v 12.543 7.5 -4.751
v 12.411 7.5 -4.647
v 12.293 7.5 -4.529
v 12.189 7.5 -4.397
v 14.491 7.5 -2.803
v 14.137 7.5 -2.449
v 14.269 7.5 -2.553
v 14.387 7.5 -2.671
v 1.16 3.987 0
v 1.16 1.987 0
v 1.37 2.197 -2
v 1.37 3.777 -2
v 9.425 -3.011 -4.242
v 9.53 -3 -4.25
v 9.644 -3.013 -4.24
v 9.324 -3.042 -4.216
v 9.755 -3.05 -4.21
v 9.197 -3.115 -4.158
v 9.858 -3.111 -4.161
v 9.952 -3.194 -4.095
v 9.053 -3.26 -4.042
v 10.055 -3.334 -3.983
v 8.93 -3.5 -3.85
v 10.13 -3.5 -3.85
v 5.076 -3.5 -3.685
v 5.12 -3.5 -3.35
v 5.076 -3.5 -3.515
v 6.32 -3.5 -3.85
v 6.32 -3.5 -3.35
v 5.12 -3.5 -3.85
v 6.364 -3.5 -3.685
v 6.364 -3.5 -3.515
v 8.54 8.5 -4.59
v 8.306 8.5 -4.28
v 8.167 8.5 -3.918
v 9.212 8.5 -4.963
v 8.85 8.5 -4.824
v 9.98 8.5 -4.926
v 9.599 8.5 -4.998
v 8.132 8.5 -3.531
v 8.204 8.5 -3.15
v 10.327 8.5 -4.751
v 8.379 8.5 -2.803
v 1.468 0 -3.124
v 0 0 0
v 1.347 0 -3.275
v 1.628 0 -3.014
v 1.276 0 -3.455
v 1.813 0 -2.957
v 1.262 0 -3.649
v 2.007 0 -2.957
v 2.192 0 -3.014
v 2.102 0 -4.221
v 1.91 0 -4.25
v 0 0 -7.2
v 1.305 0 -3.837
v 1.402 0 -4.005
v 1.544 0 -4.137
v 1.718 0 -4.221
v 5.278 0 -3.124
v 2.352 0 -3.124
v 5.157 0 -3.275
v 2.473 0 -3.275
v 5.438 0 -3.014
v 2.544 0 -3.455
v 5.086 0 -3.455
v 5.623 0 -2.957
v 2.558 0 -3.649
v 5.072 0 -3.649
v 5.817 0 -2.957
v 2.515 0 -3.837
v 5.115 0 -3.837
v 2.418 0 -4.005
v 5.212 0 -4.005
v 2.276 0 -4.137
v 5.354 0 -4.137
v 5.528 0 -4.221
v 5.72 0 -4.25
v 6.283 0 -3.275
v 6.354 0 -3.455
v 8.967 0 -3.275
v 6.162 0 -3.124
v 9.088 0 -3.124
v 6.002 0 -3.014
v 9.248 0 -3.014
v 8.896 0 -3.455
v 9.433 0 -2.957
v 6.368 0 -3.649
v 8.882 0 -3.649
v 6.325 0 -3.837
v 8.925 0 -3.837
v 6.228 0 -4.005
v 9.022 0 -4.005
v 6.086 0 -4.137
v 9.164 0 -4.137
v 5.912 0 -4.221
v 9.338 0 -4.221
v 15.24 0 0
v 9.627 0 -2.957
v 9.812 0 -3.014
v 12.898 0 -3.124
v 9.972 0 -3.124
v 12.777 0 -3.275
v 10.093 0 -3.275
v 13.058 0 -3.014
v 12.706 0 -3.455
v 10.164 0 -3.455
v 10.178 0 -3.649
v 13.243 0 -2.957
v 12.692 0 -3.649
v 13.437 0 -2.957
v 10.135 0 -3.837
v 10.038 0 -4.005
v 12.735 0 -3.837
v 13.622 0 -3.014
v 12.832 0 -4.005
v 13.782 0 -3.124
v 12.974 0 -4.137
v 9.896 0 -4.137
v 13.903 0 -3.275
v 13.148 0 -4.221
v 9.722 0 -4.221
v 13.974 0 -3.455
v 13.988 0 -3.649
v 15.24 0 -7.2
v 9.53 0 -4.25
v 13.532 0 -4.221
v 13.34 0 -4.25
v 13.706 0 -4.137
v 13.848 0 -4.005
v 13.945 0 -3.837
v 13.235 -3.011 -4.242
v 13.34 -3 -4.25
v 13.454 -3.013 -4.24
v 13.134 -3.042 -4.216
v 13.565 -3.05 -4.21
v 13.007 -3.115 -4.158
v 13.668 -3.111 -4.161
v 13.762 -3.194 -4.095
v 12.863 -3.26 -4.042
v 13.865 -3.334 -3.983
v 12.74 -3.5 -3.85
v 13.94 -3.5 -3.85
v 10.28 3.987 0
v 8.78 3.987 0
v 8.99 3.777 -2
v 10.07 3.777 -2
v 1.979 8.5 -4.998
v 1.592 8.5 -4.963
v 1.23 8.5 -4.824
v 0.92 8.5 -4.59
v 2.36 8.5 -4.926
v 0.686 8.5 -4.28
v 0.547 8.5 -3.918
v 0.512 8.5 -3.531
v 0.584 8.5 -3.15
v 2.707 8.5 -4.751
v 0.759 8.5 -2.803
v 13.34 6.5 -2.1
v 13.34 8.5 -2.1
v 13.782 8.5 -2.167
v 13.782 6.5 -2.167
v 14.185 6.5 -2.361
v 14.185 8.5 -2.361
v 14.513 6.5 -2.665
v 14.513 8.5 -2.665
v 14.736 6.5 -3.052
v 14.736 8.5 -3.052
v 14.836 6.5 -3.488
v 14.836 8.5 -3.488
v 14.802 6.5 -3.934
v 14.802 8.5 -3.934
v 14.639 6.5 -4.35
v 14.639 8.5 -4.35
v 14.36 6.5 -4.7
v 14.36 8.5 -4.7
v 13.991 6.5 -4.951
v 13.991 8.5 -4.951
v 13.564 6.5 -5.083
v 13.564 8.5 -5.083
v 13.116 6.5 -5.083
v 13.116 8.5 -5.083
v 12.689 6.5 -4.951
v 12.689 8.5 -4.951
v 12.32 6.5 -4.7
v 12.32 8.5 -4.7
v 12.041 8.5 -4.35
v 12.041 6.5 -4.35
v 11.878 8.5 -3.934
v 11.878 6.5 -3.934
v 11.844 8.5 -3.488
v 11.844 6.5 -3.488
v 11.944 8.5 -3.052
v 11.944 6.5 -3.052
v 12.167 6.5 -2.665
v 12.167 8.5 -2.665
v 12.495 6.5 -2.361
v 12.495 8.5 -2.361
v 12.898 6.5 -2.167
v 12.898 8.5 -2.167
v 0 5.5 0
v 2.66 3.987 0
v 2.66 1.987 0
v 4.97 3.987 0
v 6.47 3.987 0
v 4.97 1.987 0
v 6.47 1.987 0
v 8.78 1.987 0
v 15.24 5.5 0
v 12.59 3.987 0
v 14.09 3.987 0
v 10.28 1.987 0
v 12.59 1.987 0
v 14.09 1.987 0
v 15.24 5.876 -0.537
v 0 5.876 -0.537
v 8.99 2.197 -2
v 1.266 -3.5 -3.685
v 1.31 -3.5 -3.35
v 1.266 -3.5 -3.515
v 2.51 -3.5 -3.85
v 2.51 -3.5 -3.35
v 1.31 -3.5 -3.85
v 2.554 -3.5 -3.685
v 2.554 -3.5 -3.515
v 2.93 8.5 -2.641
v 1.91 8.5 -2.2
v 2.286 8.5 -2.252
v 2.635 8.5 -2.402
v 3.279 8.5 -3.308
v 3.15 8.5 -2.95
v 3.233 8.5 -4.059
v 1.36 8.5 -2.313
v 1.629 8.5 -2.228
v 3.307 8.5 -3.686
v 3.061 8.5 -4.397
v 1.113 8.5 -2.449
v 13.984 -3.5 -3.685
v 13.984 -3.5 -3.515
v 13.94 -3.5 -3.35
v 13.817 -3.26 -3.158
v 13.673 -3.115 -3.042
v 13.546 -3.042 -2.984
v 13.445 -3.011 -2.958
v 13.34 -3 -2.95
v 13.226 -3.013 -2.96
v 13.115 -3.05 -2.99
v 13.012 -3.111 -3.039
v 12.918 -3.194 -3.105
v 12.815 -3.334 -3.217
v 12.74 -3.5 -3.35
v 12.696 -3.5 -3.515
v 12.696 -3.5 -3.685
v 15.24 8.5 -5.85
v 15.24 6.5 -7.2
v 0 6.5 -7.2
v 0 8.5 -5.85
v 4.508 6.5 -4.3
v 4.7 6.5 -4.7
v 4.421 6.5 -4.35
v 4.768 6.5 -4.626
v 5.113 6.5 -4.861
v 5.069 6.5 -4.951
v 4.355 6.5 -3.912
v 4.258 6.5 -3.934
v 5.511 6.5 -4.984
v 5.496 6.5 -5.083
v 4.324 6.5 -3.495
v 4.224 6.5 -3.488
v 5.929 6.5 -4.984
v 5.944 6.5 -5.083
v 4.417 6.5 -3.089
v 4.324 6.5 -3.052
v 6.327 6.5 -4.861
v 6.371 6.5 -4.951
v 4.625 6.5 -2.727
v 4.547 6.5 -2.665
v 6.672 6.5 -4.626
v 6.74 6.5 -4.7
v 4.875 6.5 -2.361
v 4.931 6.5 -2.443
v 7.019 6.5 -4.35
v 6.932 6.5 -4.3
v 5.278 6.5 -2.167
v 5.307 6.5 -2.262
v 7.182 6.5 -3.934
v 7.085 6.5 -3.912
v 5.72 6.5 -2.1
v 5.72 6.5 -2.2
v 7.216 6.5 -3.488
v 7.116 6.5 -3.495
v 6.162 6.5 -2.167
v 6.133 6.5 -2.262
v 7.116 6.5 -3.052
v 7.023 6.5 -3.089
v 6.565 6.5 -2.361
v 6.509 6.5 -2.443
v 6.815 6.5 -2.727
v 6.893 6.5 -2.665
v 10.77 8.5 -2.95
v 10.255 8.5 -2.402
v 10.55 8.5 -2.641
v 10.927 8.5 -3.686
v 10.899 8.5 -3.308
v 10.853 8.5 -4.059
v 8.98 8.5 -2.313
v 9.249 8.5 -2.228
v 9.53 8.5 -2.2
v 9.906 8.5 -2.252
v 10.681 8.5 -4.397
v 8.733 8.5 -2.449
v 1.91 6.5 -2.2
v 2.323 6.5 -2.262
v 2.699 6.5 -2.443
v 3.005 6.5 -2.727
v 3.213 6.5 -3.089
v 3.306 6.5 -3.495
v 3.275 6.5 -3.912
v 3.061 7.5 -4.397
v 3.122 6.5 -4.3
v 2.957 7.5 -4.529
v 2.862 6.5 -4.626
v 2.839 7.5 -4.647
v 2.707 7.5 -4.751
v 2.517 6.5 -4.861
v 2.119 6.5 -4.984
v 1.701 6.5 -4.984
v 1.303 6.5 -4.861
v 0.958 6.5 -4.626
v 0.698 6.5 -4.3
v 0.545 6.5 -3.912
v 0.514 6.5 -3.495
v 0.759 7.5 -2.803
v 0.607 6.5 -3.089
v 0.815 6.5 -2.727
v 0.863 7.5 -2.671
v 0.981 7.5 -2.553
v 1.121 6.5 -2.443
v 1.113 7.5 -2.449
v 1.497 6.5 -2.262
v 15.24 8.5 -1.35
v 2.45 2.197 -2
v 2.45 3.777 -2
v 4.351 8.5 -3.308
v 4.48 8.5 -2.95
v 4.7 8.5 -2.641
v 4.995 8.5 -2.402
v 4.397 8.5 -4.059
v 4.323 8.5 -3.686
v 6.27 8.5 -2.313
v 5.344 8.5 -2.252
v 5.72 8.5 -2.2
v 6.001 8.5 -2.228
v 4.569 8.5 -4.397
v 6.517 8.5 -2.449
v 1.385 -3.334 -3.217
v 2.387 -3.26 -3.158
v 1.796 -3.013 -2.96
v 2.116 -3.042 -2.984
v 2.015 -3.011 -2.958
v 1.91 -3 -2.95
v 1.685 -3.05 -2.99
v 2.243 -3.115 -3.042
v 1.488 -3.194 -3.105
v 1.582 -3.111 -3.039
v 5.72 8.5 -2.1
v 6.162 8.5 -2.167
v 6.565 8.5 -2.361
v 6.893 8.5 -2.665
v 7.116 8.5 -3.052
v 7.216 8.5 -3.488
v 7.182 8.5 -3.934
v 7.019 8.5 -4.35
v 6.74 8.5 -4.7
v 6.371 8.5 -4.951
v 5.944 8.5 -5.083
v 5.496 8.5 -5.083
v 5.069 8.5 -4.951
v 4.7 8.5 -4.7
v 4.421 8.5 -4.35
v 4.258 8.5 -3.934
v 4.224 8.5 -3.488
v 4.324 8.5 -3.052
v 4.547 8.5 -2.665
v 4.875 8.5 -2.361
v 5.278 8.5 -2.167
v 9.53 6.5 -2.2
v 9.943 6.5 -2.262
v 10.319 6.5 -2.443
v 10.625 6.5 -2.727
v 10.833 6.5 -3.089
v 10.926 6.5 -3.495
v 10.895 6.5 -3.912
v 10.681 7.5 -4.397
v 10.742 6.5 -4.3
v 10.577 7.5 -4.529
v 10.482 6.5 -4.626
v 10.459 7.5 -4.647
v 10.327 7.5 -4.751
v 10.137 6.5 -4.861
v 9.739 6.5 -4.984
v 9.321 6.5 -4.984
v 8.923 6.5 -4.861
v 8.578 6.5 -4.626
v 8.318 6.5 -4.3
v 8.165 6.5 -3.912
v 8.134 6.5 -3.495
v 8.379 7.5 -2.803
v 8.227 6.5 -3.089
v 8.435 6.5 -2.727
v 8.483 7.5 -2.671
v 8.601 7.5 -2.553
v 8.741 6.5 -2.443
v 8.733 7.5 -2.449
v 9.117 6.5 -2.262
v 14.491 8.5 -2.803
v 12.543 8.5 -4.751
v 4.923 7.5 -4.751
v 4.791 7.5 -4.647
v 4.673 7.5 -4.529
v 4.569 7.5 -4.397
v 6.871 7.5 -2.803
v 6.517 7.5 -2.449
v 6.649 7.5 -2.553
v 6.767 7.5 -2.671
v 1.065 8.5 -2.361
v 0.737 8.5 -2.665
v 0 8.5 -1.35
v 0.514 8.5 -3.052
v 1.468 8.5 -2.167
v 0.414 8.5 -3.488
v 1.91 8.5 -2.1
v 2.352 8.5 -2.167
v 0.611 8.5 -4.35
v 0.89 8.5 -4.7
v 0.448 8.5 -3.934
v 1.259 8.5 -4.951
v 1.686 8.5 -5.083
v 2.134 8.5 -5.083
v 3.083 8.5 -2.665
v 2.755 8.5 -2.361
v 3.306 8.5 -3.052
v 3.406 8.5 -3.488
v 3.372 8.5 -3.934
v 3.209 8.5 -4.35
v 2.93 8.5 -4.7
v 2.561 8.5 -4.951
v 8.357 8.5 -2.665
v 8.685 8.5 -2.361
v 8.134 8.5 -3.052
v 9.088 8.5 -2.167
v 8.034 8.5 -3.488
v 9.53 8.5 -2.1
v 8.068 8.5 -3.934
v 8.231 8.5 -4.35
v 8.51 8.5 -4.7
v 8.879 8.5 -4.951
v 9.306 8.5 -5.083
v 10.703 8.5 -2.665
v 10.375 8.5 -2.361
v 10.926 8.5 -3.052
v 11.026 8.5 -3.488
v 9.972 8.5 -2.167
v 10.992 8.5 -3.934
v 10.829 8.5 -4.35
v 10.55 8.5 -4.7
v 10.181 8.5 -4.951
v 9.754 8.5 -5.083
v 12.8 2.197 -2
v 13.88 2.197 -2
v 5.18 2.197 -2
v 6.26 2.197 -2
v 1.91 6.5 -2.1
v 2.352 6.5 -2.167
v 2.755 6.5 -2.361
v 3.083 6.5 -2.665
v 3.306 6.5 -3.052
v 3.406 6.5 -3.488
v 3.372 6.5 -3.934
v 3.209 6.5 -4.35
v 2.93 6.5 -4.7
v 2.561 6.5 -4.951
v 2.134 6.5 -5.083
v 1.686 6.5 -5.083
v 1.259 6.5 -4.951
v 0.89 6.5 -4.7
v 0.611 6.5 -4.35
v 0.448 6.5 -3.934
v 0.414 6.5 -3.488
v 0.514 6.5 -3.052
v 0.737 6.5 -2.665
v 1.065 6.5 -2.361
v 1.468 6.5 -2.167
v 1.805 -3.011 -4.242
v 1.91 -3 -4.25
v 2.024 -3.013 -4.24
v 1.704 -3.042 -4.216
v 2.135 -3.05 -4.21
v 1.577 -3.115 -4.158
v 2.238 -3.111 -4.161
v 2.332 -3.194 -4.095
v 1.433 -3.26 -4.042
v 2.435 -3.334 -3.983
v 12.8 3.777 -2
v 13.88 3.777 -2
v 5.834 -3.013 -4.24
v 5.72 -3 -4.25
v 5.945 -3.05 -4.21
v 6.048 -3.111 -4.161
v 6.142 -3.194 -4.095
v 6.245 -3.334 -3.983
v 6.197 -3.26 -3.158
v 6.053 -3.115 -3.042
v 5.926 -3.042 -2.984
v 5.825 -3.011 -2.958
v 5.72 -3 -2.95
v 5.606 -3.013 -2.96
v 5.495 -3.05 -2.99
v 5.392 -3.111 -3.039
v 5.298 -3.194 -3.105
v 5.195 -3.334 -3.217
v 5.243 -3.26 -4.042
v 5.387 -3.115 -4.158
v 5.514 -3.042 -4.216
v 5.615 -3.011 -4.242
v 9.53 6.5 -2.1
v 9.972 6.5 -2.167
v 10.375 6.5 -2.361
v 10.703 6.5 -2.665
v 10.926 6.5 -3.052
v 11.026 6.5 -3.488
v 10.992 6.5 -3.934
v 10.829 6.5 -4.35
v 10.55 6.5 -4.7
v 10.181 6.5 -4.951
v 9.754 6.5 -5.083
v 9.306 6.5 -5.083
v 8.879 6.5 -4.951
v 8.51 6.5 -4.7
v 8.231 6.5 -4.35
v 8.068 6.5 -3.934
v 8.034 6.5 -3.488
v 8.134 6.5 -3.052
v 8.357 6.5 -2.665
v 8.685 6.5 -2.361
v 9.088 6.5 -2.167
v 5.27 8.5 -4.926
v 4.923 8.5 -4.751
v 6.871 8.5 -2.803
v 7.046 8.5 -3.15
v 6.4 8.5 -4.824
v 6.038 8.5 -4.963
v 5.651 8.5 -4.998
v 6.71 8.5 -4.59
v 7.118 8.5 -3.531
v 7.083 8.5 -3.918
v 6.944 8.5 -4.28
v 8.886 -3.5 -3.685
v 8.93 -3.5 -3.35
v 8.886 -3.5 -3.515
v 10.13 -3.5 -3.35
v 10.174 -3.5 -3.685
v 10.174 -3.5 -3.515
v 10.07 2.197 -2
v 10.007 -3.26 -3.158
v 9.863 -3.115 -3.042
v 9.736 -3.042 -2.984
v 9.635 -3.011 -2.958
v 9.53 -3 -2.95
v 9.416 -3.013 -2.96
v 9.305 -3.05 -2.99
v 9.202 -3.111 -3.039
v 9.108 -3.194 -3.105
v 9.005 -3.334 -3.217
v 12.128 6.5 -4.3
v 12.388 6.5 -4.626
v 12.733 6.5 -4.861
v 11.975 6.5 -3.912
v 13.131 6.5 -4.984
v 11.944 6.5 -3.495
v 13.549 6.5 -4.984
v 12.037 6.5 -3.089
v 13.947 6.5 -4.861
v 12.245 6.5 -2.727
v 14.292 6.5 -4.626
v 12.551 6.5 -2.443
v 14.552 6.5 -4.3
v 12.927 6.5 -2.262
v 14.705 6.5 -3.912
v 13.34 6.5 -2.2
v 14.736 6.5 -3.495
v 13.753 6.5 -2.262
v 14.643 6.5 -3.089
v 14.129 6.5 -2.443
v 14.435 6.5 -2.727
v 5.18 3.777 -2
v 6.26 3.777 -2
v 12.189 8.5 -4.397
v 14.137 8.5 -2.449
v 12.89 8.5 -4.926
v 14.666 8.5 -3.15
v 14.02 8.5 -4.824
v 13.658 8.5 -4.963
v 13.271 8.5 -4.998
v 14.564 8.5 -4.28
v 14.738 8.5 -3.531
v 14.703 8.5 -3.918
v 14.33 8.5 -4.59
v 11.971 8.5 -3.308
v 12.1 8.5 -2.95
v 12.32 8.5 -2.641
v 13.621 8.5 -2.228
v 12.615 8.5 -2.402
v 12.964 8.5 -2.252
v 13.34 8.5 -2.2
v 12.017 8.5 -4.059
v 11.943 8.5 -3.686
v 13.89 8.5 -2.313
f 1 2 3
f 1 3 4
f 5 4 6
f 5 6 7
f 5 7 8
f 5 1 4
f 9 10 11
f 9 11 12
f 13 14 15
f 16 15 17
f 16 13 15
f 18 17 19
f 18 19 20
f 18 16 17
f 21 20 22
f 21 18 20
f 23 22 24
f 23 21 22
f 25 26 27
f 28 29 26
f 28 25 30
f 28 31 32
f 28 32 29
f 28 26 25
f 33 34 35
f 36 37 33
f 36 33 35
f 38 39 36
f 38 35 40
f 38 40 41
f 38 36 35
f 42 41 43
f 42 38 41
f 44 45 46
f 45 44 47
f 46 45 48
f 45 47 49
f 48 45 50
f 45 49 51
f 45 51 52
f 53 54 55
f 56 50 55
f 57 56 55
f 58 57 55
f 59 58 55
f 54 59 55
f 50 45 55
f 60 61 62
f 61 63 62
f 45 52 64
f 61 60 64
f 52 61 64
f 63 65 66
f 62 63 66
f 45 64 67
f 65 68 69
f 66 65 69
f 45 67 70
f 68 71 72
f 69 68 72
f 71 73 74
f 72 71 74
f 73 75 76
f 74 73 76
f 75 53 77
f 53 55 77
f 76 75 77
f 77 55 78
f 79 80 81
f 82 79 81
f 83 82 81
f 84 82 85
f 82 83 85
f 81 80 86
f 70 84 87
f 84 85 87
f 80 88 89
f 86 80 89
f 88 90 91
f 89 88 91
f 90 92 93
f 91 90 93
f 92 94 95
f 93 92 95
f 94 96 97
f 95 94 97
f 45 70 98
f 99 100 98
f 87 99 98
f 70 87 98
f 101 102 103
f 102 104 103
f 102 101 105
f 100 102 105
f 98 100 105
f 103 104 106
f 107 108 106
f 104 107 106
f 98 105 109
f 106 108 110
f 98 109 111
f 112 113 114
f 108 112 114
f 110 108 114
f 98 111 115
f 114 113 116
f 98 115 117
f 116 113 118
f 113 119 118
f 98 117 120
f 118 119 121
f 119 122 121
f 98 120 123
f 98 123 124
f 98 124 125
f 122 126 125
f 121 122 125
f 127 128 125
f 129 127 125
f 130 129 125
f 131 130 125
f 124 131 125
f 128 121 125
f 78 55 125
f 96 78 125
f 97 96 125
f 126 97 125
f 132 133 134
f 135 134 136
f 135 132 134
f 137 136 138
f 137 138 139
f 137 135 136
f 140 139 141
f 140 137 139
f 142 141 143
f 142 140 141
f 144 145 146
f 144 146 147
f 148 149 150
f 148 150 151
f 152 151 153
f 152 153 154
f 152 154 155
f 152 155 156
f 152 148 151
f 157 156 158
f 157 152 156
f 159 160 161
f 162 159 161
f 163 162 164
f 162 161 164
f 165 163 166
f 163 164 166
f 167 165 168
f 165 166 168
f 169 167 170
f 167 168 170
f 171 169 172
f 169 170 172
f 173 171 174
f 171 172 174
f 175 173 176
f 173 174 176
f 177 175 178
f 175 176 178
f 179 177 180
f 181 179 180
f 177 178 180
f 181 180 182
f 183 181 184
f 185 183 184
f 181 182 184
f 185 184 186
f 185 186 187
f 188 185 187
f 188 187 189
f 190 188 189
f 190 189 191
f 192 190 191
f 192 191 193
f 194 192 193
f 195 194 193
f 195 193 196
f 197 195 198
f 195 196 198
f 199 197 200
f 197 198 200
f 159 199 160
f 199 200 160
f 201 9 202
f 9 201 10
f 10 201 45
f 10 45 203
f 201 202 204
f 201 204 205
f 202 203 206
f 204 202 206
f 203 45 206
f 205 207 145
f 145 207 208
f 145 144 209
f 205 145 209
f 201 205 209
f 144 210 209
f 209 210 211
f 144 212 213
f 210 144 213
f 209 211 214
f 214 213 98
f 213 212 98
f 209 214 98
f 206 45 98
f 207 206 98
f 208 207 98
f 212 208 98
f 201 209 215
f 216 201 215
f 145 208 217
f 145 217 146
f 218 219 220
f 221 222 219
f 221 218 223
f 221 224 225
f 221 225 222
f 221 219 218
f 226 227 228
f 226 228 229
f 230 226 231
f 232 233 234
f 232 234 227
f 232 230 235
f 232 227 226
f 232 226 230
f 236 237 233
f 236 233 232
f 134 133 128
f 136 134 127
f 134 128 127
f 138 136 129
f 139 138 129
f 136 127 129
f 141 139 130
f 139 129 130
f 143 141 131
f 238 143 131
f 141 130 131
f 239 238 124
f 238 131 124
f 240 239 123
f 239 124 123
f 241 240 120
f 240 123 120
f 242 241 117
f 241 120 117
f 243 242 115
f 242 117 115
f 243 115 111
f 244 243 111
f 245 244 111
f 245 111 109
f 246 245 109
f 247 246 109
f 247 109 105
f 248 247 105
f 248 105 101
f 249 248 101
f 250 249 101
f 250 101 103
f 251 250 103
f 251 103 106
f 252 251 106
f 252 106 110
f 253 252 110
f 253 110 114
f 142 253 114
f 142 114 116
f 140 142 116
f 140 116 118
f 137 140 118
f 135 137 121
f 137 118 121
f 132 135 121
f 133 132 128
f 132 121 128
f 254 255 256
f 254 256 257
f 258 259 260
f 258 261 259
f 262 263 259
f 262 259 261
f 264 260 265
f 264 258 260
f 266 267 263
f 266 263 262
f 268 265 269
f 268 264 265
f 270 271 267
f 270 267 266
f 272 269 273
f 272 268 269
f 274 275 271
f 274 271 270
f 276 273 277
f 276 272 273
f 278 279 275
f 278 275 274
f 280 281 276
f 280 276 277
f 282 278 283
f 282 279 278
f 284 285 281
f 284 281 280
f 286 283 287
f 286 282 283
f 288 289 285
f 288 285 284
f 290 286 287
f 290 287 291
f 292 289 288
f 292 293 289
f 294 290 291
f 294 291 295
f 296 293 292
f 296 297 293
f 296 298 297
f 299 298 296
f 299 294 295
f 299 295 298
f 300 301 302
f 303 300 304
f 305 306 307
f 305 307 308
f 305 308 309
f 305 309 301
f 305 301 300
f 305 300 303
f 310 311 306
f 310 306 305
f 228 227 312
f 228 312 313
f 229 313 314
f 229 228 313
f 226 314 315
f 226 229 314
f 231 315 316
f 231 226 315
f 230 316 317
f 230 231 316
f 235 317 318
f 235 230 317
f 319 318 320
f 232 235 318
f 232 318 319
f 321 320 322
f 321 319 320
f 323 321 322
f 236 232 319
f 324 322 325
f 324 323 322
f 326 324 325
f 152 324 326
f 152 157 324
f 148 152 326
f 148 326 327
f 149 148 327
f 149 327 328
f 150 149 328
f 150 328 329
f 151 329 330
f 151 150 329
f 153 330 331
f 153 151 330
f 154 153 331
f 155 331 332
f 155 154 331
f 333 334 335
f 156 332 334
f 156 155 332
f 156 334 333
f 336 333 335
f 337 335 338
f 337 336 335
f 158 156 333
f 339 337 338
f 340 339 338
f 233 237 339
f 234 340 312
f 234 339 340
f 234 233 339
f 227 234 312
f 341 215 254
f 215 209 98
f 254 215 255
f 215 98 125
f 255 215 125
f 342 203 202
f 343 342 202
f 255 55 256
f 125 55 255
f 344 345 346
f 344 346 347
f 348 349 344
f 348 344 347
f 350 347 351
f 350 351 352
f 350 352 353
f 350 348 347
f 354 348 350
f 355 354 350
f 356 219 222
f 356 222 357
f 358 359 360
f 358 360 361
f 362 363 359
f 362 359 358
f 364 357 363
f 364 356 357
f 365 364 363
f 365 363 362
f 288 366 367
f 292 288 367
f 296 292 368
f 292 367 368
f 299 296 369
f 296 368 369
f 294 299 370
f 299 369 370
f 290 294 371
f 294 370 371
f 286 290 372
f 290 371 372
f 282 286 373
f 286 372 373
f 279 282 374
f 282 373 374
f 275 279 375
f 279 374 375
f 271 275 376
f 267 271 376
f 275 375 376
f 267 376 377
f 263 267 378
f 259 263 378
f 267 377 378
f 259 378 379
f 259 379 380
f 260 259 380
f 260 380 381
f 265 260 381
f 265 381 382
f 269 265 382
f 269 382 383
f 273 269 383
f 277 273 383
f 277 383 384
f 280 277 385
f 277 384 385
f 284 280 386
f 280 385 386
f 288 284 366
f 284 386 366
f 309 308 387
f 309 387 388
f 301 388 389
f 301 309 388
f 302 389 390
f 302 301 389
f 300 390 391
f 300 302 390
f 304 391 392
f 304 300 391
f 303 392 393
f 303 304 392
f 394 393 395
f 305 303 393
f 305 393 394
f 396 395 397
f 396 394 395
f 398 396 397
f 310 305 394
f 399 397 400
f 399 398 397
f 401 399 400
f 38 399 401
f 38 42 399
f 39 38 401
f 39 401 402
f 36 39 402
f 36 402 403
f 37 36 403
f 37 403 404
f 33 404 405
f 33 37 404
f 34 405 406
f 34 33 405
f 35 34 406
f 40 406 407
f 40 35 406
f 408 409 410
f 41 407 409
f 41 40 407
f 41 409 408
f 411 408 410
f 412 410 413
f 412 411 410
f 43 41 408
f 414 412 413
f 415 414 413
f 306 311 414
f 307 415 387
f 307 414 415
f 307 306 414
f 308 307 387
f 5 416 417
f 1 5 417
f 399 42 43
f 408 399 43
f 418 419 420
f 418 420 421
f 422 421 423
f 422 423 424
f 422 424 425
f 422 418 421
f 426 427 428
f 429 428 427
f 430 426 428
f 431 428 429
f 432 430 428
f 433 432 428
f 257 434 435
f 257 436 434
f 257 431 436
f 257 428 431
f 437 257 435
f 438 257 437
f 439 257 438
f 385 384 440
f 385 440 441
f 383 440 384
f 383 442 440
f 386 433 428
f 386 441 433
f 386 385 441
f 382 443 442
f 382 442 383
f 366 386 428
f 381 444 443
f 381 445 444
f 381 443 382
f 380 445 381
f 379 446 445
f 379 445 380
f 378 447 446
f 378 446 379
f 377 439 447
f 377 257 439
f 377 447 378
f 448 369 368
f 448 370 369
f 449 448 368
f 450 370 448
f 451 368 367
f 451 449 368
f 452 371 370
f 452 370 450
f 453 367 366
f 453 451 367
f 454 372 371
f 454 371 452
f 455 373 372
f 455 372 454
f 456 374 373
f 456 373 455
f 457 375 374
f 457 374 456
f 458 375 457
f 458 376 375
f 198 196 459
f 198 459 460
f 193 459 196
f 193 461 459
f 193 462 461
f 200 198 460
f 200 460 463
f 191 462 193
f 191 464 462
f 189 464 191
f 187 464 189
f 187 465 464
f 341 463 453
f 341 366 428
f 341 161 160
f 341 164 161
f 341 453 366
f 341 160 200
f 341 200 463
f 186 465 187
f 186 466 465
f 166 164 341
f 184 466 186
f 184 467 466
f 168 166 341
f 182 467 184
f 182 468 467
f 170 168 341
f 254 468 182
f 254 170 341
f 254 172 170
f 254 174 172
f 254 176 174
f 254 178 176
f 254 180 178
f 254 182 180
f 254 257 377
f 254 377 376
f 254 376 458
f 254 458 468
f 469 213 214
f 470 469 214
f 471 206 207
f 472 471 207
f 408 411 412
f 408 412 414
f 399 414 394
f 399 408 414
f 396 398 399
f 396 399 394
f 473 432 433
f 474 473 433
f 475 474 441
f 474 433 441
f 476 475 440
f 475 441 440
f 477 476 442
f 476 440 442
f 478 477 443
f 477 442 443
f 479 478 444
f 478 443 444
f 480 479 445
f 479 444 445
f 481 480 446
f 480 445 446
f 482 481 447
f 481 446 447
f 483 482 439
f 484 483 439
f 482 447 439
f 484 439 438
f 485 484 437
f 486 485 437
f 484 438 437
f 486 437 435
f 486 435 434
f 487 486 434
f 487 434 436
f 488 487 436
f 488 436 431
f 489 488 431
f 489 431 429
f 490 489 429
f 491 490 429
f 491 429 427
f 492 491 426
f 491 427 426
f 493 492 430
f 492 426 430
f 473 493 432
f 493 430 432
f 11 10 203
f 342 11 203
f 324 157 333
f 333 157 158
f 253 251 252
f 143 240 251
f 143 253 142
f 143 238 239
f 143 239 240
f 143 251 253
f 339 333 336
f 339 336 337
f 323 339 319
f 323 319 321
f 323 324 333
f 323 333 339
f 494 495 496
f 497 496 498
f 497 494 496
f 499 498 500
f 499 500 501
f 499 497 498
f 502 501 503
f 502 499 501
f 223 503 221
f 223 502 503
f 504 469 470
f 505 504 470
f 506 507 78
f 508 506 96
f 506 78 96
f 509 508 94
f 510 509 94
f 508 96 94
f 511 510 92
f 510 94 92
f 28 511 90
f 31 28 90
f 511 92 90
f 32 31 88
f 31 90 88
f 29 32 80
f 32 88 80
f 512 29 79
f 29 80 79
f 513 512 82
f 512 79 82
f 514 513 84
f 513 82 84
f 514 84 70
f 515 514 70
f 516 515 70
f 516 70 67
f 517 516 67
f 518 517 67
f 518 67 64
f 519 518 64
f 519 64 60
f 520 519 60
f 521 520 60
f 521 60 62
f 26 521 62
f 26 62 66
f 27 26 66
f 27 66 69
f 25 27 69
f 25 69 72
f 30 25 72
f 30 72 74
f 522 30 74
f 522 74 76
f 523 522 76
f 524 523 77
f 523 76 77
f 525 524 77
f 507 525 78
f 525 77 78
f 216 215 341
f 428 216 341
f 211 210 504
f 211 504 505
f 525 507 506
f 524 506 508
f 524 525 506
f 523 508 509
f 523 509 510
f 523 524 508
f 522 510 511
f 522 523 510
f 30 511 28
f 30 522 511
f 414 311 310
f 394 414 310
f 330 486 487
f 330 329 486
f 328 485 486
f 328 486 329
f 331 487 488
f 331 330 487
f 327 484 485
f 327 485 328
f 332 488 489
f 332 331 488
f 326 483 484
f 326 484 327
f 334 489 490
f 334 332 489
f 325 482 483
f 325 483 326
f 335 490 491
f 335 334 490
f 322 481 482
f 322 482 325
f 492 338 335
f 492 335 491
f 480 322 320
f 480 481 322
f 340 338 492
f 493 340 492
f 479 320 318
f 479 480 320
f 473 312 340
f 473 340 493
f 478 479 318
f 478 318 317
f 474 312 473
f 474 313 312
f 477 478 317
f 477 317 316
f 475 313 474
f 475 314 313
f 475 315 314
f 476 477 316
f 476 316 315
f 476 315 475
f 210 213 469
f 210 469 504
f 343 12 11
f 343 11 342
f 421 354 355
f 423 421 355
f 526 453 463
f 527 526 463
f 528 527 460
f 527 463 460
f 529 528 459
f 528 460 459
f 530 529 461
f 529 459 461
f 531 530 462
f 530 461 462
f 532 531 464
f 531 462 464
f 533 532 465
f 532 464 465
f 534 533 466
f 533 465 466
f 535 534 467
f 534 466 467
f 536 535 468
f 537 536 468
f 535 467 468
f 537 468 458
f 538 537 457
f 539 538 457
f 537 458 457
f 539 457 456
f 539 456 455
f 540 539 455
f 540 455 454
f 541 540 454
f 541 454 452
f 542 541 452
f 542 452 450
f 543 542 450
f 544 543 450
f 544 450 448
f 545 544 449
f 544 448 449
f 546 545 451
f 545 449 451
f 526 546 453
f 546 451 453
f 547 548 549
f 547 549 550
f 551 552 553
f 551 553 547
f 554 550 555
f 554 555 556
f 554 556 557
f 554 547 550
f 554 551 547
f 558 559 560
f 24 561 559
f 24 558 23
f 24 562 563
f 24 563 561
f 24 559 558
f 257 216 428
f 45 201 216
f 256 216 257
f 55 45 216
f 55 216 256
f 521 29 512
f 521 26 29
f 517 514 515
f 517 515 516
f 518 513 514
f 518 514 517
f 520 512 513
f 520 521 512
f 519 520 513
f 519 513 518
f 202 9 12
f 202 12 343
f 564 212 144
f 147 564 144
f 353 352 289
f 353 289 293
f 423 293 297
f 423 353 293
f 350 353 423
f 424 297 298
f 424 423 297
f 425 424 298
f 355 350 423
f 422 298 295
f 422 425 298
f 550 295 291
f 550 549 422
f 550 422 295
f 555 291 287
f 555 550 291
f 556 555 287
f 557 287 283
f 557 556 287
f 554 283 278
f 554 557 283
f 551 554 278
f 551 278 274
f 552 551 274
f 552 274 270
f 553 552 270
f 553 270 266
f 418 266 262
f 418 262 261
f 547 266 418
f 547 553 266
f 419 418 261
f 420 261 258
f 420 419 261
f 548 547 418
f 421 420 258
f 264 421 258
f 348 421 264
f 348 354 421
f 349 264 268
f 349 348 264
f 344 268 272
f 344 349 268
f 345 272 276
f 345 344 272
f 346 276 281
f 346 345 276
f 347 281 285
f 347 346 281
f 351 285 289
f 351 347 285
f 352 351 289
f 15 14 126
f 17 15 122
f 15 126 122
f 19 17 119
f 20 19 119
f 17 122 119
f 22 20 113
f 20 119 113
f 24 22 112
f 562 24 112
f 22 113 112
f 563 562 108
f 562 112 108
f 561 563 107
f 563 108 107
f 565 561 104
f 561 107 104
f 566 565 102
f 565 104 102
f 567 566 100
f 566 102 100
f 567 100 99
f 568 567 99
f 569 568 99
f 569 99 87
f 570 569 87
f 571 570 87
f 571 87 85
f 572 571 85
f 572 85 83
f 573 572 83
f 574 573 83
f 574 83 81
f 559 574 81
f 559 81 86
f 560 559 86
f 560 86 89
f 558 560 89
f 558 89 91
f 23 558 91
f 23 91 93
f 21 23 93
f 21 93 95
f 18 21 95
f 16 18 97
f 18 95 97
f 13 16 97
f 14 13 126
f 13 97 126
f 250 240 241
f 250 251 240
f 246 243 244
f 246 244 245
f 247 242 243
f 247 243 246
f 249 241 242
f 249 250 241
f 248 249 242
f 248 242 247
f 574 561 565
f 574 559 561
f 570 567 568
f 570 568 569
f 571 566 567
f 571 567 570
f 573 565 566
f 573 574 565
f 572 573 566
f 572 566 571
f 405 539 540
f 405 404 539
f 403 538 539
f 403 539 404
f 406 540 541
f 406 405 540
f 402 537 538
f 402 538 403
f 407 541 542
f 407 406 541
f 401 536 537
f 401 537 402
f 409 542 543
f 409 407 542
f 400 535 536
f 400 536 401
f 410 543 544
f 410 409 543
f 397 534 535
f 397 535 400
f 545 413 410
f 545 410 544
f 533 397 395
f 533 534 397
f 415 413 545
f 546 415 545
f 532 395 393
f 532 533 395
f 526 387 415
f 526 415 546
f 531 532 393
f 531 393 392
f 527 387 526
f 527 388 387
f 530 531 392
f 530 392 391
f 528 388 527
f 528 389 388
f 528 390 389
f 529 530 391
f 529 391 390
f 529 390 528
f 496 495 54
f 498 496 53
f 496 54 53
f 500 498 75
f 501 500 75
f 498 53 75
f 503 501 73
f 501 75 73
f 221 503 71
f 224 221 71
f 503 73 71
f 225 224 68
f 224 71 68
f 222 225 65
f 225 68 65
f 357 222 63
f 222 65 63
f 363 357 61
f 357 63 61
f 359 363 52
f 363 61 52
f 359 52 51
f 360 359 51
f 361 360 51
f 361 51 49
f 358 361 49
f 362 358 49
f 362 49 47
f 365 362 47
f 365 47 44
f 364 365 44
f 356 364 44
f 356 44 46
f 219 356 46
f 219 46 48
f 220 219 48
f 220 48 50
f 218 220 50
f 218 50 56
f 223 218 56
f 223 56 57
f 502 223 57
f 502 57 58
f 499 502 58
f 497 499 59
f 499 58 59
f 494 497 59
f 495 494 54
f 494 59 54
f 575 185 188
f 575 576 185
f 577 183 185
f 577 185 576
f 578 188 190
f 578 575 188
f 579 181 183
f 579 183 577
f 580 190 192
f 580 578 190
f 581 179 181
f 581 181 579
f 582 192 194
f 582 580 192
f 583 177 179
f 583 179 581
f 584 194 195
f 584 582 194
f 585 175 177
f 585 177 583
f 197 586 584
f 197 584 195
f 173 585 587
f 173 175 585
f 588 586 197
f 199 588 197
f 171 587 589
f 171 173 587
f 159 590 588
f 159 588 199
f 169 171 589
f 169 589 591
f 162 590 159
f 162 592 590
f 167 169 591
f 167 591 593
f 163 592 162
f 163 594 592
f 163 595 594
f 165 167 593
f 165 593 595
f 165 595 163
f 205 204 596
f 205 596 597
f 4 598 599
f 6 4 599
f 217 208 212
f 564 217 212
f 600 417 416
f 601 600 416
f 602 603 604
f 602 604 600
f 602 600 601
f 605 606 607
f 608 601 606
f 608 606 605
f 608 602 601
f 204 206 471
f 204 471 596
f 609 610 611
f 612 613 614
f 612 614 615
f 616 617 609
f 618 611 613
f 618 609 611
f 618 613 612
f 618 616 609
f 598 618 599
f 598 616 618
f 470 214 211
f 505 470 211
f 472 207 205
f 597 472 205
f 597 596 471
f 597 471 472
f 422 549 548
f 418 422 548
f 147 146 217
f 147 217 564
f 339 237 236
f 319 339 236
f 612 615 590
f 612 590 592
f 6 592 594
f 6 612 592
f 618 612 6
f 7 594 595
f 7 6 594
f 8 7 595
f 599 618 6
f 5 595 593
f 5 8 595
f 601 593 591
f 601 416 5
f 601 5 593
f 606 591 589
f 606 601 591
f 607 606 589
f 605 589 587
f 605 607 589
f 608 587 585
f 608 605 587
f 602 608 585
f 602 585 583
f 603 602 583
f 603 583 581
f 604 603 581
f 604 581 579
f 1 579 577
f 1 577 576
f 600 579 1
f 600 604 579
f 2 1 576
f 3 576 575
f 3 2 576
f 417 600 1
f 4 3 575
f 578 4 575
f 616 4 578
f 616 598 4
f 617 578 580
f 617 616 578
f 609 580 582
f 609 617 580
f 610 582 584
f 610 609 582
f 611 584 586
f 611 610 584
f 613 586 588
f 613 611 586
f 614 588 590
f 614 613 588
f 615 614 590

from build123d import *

# Parameters (mm, degrees)
SKETCH3_W                    = 15.24
SKETCH3_H                    = 7.2
BOSS_EXTRUDE1_DEPTH          = 8.5
SKETCH4_R                    = 0.65
BOSS_EXTRUDE2_DEPTH          = 3.5
CUT_EXTRUDE1_REACH           = 20.877
CUT_EXTRUDE3_DEPTH           = 15.24
SKETCH13_W                   = 1.5
SKETCH13_H                   = 2
CUT_EXTRUDE4_DEPTH           = 2
CUT_EXTRUDE4_DRAFT           = -6
CUT_EXTRUDE4_PROFILE_2_DEPTH = 2
CUT_EXTRUDE4_PROFILE_2_DRAFT = -6
CUT_EXTRUDE4_PROFILE_3_DEPTH = 2
CUT_EXTRUDE4_PROFILE_3_DRAFT = -6
CUT_EXTRUDE4_PROFILE_4_DEPTH = 2
CUT_EXTRUDE4_PROFILE_4_DRAFT = -6
SKETCH14_R                   = 1.5
SKETCH14_R_2                 = 1.4
CUT_EXTRUDE5_DEPTH           = 2
CUT_EXTRUDE6_DEPTH           = 1


with BuildPart() as part:
    # Sketch3 → Boss-Extrude1 (new body)
    with BuildSketch(Plane(origin=(0, 0, 0), x_dir=(1, 0, 0), z_dir=(0, 1, 0))):
        with Locations((7.62, 3.6)):
            Rectangle(SKETCH3_W, SKETCH3_H)
    extrude(amount=BOSS_EXTRUDE1_DEPTH)

    # Sketch4 → Boss-Extrude2 (add)
    with BuildSketch(Plane(origin=(0, 0, 0), x_dir=(-1, 0, 0), z_dir=(0, -1, 0))):
        with Locations(Location((-1.91, 3.6, 0), (0, 0, 90))):
            Circle(SKETCH4_R)
        with Locations(Location((-5.72, 3.6, 0), (0, 0, 90))):
            Circle(SKETCH4_R)
        with Locations(Location((-9.53, 3.6, 0), (0, 0, 90))):
            Circle(SKETCH4_R)
        with Locations(Location((-13.34, 3.6, 0), (0, 0, 90))):
            Circle(SKETCH4_R)
    extrude(amount=BOSS_EXTRUDE2_DEPTH)

    # Cut-Extrude1: up to this face of the body (flat: up to its plane)
    cut_extrude1_end = Plane(part.part.faces().sort_by_distance((15.24, 4.25, -3.6))[0])
    # Sketch5 → Cut-Extrude1 (cut, up to the picked face)
    with BuildSketch(Plane.ZY, mode=Mode.PRIVATE) as cut_extrude1_sk1:
        Polygon((-2.95, -3), (-2.95, -3.5), (-3.35, -3.5), align=None)
    cut_extrude1_tool1 = split(extrude(cut_extrude1_sk1.sketch, amount=-CUT_EXTRUDE1_REACH, mode=Mode.PRIVATE), bisect_by=cut_extrude1_end, keep=Keep.BOTH, mode=Mode.PRIVATE)
    # Sketch5 → Cut-Extrude1 (cut, up to the picked face)
    with BuildSketch(Plane.ZY, mode=Mode.PRIVATE) as cut_extrude1_sk2:
        Polygon((-4.25, -3), (-3.85, -3.5), (-4.25, -3.5), align=None)
    cut_extrude1_tool2 = split(extrude(cut_extrude1_sk2.sketch, amount=-CUT_EXTRUDE1_REACH, mode=Mode.PRIVATE), bisect_by=cut_extrude1_end, keep=Keep.BOTH, mode=Mode.PRIVATE)
    add(cut_extrude1_tool1.solids().sort_by(Axis((0, -3.333333, -3.083333), (1, 0, 0)))[0], mode=Mode.SUBTRACT)
    add(cut_extrude1_tool2.solids().sort_by(Axis((0, -3.333333, -4.116667), (1, 0, 0)))[0], mode=Mode.SUBTRACT)

    # Sketch8 → Cut-Extrude3 (cut)
    with BuildSketch(Plane(origin=(15.24, 0, 0), x_dir=(0, 0, -1), z_dir=(1, 0, 0))):
        Polygon((0, 5.5), (0.537301365, 5.876222466), (1.35, 8.5), (0, 8.5), align=None)
        Polygon((7.2, 6.5), (5.85, 8.5), (7.2, 8.5), align=None)
    extrude(amount=-CUT_EXTRUDE3_DEPTH, mode=Mode.SUBTRACT)


with BuildPart() as cut_extrude4_tool:
    # Sketch13 → Cut-Extrude4 (with draft: the straight prism first)
    with BuildSketch(Plane.XY):
        with Locations((13.34, 2.98672158)):
            Rectangle(SKETCH13_W, SKETCH13_H)
    extrude(amount=-CUT_EXTRUDE4_DEPTH)
    # Cut-Extrude4: the draft: its side faces are tilted about the plane it starts from
    cut_extrude4_sides = [cut_extrude4_tool.faces().sort_by_distance(p)[0] for p in [
        (13.34, 1.98672158, -1),
        (14.09, 2.98672158, -1),
        (13.34, 3.98672158, -1),
        (12.59, 2.98672158, -1),
    ]]
    draft(cut_extrude4_sides, Plane.XY, CUT_EXTRUDE4_DRAFT)


with BuildPart() as part_1:
    add(part.part)

    # Cut-Extrude4: cut by cut_extrude4_tool
    add(cut_extrude4_tool.part, mode=Mode.SUBTRACT)


with BuildPart() as cut_extrude4_profile_2_tool:
    # Sketch13 → Cut-Extrude4 profile 2 (with draft: the straight prism first)
    with BuildSketch(Plane.XY):
        with Locations((9.53, 2.98672158)):
            Rectangle(SKETCH13_W, SKETCH13_H)
    extrude(amount=-CUT_EXTRUDE4_PROFILE_2_DEPTH)
    # Cut-Extrude4 profile 2: the draft: its side faces are tilted about the plane it starts from
    cut_extrude4_profile_2_sides = [cut_extrude4_profile_2_tool.faces().sort_by_distance(p)[0] for p in [
        (9.53, 1.98672158, -1),
        (10.28, 2.98672158, -1),
        (9.53, 3.98672158, -1),
        (8.78, 2.98672158, -1),
    ]]
    draft(cut_extrude4_profile_2_sides, Plane.XY, CUT_EXTRUDE4_PROFILE_2_DRAFT)


with BuildPart() as part_2:
    add(part_1.part)

    # Cut-Extrude4 profile 2: cut by cut_extrude4_profile_2_tool
    add(cut_extrude4_profile_2_tool.part, mode=Mode.SUBTRACT)


with BuildPart() as cut_extrude4_profile_3_tool:
    # Sketch13 → Cut-Extrude4 profile 3 (with draft: the straight prism first)
    with BuildSketch(Plane.XY):
        with Locations((5.72, 2.98672158)):
            Rectangle(SKETCH13_W, SKETCH13_H)
    extrude(amount=-CUT_EXTRUDE4_PROFILE_3_DEPTH)
    # Cut-Extrude4 profile 3: the draft: its side faces are tilted about the plane it starts from
    cut_extrude4_profile_3_sides = [cut_extrude4_profile_3_tool.faces().sort_by_distance(p)[0] for p in [
        (5.72, 1.98672158, -1),
        (6.47, 2.98672158, -1),
        (5.72, 3.98672158, -1),
        (4.97, 2.98672158, -1),
    ]]
    draft(cut_extrude4_profile_3_sides, Plane.XY, CUT_EXTRUDE4_PROFILE_3_DRAFT)


with BuildPart() as part_3:
    add(part_2.part)

    # Cut-Extrude4 profile 3: cut by cut_extrude4_profile_3_tool
    add(cut_extrude4_profile_3_tool.part, mode=Mode.SUBTRACT)


with BuildPart() as cut_extrude4_profile_4_tool:
    # Sketch13 → Cut-Extrude4 profile 4 (with draft: the straight prism first)
    with BuildSketch(Plane.XY):
        with Locations((1.91, 2.98672158)):
            Rectangle(SKETCH13_W, SKETCH13_H)
    extrude(amount=-CUT_EXTRUDE4_PROFILE_4_DEPTH)
    # Cut-Extrude4 profile 4: the draft: its side faces are tilted about the plane it starts from
    cut_extrude4_profile_4_sides = [cut_extrude4_profile_4_tool.faces().sort_by_distance(p)[0] for p in [
        (1.91, 1.98672158, -1),
        (2.66, 2.98672158, -1),
        (1.91, 3.98672158, -1),
        (1.16, 2.98672158, -1),
    ]]
    draft(cut_extrude4_profile_4_sides, Plane.XY, CUT_EXTRUDE4_PROFILE_4_DRAFT)


with BuildPart() as part_4:
    add(part_3.part)

    # Cut-Extrude4 profile 4: cut by cut_extrude4_profile_4_tool
    add(cut_extrude4_profile_4_tool.part, mode=Mode.SUBTRACT)

    # Sketch14 → Cut-Extrude5 (cut)
    # profile 1 of 4: a face of its own
    with BuildSketch(Plane(origin=(0, 8.5, 0), x_dir=(1, 0, 0), z_dir=(0, 1, 0))):
        with Locations(Location((1.91, 3.6, 0), (0, 0, 270))):
            Circle(SKETCH14_R)
        with Locations(Location((1.91, 3.6, 0), (0, 0, 270))):
            Circle(SKETCH14_R_2, mode=Mode.SUBTRACT)
    # profile 2 of 4: a face of its own
    with BuildSketch(Plane(origin=(0, 8.5, 0), x_dir=(1, 0, 0), z_dir=(0, 1, 0))):
        with Locations(Location((5.72, 3.6, 0), (0, 0, 270))):
            Circle(SKETCH14_R)
        with Locations(Location((5.72, 3.6, 0), (0, 0, 270))):
            Circle(SKETCH14_R_2, mode=Mode.SUBTRACT)
    # profile 3 of 4: a face of its own
    with BuildSketch(Plane(origin=(0, 8.5, 0), x_dir=(1, 0, 0), z_dir=(0, 1, 0))):
        with Locations(Location((9.53, 3.6, 0), (0, 0, 270))):
            Circle(SKETCH14_R)
        with Locations(Location((9.53, 3.6, 0), (0, 0, 270))):
            Circle(SKETCH14_R_2, mode=Mode.SUBTRACT)
    # profile 4 of 4: a face of its own
    with BuildSketch(Plane(origin=(0, 8.5, 0), x_dir=(1, 0, 0), z_dir=(0, 1, 0))):
        with Locations(Location((13.34, 3.6, 0), (0, 0, 270))):
            Circle(SKETCH14_R)
        with Locations(Location((13.34, 3.6, 0), (0, 0, 270))):
            Circle(SKETCH14_R_2, mode=Mode.SUBTRACT)
    extrude(amount=-CUT_EXTRUDE5_DEPTH, mode=Mode.SUBTRACT)

    # Sketch15 → Cut-Extrude6 (cut)
    with BuildSketch(Plane(origin=(0, 8.5, 0), x_dir=(1, 0, 0), z_dir=(0, 1, 0))):
        with BuildLine():
            Line((1.102525711, 2.43897232), (3.07102768, 4.407474289))
            ThreePointArc((3.07102768, 4.407474289), (2.91, 4.6), (2.717474289, 4.76102768))
            Line((2.717474289, 4.76102768), (0.74897232, 2.792525711))
            ThreePointArc((0.74897232, 2.792525711), (0.91, 2.6), (1.102525711, 2.43897232))
        make_face()
        with BuildLine():
            Line((8.732738708, 2.449185318), (10.680814682, 4.397261292))
            ThreePointArc((10.680814682, 4.397261292), (10.519949494, 4.589949494), (10.327261292, 4.750814682))
            Line((10.327261292, 4.750814682), (8.379185318, 2.802738708))
            ThreePointArc((8.379185318, 2.802738708), (8.540050506, 2.610050506), (8.732738708, 2.449185318))
        make_face()
        with BuildLine():
            Line((6.870814682, 2.802738708), (4.922738708, 4.750814682))
            ThreePointArc((4.922738708, 4.750814682), (4.730050506, 4.589949494), (4.569185318, 4.397261292))
            Line((4.569185318, 4.397261292), (6.517261292, 2.449185318))
            ThreePointArc((6.517261292, 2.449185318), (6.709949494, 2.610050506), (6.870814682, 2.802738708))
        make_face()
        with BuildLine():
            Line((14.490814682, 2.802738708), (12.542738708, 4.750814682))
            ThreePointArc((12.542738708, 4.750814682), (12.350050506, 4.589949494), (12.189185318, 4.397261292))
            Line((12.189185318, 4.397261292), (14.137261292, 2.449185318))
            ThreePointArc((14.137261292, 2.449185318), (14.329949494, 2.610050506), (14.490814682, 2.802738708))
        make_face()
    extrude(amount=-CUT_EXTRUDE6_DEPTH, mode=Mode.SUBTRACT)


solid = part_4.part
